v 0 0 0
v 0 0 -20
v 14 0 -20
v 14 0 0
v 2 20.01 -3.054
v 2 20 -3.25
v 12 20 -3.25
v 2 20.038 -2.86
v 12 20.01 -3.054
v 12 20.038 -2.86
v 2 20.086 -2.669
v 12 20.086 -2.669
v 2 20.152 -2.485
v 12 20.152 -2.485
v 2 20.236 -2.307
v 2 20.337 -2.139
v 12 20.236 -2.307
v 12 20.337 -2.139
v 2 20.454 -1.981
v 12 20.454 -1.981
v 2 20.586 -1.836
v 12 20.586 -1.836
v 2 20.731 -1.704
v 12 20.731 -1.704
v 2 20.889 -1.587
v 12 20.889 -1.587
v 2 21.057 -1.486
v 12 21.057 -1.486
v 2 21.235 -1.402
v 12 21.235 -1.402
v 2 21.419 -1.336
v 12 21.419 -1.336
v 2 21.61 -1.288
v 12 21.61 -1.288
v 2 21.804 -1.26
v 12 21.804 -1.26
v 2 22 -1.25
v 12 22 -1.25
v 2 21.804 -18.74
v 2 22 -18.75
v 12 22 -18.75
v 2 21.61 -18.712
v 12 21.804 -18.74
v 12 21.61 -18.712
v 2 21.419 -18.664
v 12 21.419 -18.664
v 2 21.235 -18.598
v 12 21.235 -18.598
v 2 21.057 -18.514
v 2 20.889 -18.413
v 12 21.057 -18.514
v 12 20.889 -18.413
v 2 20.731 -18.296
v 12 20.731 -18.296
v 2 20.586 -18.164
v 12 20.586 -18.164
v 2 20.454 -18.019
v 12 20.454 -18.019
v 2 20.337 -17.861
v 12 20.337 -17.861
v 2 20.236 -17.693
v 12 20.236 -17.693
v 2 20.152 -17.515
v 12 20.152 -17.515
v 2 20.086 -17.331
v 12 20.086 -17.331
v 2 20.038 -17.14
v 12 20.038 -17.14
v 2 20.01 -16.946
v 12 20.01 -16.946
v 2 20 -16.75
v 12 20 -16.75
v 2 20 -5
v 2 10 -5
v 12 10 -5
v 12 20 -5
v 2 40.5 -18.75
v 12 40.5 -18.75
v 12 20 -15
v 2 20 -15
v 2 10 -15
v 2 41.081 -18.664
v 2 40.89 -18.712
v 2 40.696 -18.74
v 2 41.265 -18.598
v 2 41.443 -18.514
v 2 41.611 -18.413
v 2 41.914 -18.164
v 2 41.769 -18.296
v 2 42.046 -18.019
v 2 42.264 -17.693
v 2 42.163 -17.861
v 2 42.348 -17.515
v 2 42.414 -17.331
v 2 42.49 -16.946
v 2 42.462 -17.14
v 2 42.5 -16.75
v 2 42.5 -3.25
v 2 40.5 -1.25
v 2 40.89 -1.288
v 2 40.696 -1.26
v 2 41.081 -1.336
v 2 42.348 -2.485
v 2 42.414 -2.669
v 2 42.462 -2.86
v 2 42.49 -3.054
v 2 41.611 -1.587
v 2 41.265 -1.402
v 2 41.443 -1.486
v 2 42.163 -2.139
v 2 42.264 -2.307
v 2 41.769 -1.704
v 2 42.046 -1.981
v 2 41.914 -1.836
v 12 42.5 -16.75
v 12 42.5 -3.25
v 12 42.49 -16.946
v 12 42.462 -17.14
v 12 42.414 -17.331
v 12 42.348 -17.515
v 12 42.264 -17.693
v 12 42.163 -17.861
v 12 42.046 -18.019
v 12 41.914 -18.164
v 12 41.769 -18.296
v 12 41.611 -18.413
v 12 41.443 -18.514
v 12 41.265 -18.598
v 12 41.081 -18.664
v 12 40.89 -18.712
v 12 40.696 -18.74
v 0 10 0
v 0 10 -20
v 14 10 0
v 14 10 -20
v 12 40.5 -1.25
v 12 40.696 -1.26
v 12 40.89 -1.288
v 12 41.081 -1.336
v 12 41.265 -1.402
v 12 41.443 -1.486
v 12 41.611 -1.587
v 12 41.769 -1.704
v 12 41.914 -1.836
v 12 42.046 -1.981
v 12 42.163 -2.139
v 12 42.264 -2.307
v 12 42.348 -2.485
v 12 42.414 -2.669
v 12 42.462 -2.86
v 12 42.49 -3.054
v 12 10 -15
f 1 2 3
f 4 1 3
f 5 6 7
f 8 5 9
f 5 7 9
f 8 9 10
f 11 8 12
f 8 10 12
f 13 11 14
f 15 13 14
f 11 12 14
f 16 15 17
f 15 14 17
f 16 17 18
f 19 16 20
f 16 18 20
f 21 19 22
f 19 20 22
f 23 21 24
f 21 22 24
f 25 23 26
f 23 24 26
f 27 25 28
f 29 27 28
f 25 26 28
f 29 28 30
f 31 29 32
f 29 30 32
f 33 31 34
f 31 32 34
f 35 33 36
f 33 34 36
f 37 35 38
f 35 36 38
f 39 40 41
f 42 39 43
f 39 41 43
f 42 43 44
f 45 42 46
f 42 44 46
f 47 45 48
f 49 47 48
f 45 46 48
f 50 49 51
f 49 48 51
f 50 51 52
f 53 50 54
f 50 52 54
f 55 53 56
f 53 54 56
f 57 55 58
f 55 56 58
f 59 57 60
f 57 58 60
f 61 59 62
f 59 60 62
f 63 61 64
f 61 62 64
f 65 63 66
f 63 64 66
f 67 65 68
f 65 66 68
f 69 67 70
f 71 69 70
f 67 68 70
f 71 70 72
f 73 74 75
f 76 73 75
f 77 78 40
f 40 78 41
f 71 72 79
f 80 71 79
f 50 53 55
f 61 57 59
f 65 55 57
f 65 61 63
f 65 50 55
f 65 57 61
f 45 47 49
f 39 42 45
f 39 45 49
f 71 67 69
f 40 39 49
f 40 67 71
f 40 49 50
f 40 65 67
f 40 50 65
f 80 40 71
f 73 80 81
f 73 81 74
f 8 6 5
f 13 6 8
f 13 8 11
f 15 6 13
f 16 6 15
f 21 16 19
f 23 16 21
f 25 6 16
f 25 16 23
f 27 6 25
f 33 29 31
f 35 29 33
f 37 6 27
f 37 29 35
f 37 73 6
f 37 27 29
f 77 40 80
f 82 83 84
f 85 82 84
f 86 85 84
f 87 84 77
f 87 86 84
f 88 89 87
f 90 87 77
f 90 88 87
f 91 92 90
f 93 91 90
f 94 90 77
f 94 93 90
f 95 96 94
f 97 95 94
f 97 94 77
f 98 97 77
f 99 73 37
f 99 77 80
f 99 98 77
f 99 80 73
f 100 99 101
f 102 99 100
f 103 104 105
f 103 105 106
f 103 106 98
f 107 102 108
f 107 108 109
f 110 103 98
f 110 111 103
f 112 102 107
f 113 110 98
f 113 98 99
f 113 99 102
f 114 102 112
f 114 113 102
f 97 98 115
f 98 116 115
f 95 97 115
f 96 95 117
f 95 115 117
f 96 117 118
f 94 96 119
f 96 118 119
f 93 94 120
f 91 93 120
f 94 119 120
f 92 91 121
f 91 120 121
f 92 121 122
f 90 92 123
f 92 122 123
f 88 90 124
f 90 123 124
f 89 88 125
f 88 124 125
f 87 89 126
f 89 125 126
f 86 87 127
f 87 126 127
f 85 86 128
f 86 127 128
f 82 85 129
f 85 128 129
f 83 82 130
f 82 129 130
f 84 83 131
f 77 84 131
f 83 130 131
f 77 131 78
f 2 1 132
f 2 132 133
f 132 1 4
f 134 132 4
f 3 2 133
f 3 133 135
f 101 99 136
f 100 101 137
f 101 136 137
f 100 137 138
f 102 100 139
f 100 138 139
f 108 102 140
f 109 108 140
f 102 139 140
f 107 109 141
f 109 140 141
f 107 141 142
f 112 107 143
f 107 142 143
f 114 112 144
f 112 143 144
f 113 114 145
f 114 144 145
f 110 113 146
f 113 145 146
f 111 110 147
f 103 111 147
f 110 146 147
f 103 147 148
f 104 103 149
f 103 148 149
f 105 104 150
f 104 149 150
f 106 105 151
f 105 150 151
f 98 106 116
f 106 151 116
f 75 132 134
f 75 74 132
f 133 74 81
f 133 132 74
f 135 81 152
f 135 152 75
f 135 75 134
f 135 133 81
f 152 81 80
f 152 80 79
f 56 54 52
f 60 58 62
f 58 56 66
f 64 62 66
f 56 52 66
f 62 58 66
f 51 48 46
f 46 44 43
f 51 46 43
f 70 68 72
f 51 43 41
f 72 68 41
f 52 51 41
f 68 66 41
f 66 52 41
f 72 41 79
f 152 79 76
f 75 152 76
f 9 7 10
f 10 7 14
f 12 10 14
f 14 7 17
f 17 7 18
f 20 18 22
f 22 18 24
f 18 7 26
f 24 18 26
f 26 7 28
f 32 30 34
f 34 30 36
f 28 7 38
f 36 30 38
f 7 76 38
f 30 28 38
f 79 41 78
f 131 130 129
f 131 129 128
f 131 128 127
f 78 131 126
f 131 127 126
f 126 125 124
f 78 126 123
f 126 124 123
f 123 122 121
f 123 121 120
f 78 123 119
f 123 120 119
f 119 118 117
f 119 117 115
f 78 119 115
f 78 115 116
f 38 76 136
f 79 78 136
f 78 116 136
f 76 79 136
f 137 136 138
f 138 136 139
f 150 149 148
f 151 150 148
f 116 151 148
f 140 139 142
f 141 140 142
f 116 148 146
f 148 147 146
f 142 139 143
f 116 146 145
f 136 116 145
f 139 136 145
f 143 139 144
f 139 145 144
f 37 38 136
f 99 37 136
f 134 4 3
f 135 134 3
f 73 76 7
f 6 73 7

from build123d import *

# Parameters (mm, degrees)
SKETCH1_W           = 14
SKETCH1_H           = 20
BOSS_EXTRUDE1_DEPTH = 10
SKETCH2_W           = 10
SKETCH2_H           = 10
BOSS_EXTRUDE2_DEPTH = 10
BOSS_EXTRUDE3_DEPTH = 5


with BuildPart() as part:
    # Sketch1 → Boss-Extrude1 (new body)
    with BuildSketch(Plane(origin=(0, 0, 0), x_dir=(1, 0, 0), z_dir=(0, 1, 0))):
        with Locations((7, 10)):
            Rectangle(SKETCH1_W, SKETCH1_H)
    extrude(amount=BOSS_EXTRUDE1_DEPTH)

    # Sketch2 → Boss-Extrude2 (add)
    with BuildSketch(Plane(origin=(0, 10, 0), x_dir=(1, 0, 0), z_dir=(0, 1, 0))):
        with Locations((7, 10)):
            Rectangle(SKETCH2_W, SKETCH2_H)
    extrude(amount=BOSS_EXTRUDE2_DEPTH)

    # Sketch3 → Boss-Extrude3 (add, symmetric)
    with BuildSketch(Plane(origin=(7, 0, 0), x_dir=(0, 0, -1), z_dir=(1, 0, 0))):
        with BuildLine():
            Line((1.25, 22), (1.25, 40.5))
            ThreePointArc((1.25, 40.5), (1.835786438, 41.914213562), (3.25, 42.5))
            Line((3.25, 42.5), (16.75, 42.5))
            ThreePointArc((16.75, 42.5), (18.164213562, 41.914213562), (18.75, 40.5))
            Line((18.75, 40.5), (18.75, 22))
            ThreePointArc((18.75, 22), (18.164213562, 20.585786438), (16.75, 20))
            Line((16.75, 20), (3.25, 20))
            ThreePointArc((3.25, 20), (1.835786438, 20.585786438), (1.25, 22))
        make_face()
    extrude(amount=BOSS_EXTRUDE3_DEPTH, both=True)


solid = part.part
